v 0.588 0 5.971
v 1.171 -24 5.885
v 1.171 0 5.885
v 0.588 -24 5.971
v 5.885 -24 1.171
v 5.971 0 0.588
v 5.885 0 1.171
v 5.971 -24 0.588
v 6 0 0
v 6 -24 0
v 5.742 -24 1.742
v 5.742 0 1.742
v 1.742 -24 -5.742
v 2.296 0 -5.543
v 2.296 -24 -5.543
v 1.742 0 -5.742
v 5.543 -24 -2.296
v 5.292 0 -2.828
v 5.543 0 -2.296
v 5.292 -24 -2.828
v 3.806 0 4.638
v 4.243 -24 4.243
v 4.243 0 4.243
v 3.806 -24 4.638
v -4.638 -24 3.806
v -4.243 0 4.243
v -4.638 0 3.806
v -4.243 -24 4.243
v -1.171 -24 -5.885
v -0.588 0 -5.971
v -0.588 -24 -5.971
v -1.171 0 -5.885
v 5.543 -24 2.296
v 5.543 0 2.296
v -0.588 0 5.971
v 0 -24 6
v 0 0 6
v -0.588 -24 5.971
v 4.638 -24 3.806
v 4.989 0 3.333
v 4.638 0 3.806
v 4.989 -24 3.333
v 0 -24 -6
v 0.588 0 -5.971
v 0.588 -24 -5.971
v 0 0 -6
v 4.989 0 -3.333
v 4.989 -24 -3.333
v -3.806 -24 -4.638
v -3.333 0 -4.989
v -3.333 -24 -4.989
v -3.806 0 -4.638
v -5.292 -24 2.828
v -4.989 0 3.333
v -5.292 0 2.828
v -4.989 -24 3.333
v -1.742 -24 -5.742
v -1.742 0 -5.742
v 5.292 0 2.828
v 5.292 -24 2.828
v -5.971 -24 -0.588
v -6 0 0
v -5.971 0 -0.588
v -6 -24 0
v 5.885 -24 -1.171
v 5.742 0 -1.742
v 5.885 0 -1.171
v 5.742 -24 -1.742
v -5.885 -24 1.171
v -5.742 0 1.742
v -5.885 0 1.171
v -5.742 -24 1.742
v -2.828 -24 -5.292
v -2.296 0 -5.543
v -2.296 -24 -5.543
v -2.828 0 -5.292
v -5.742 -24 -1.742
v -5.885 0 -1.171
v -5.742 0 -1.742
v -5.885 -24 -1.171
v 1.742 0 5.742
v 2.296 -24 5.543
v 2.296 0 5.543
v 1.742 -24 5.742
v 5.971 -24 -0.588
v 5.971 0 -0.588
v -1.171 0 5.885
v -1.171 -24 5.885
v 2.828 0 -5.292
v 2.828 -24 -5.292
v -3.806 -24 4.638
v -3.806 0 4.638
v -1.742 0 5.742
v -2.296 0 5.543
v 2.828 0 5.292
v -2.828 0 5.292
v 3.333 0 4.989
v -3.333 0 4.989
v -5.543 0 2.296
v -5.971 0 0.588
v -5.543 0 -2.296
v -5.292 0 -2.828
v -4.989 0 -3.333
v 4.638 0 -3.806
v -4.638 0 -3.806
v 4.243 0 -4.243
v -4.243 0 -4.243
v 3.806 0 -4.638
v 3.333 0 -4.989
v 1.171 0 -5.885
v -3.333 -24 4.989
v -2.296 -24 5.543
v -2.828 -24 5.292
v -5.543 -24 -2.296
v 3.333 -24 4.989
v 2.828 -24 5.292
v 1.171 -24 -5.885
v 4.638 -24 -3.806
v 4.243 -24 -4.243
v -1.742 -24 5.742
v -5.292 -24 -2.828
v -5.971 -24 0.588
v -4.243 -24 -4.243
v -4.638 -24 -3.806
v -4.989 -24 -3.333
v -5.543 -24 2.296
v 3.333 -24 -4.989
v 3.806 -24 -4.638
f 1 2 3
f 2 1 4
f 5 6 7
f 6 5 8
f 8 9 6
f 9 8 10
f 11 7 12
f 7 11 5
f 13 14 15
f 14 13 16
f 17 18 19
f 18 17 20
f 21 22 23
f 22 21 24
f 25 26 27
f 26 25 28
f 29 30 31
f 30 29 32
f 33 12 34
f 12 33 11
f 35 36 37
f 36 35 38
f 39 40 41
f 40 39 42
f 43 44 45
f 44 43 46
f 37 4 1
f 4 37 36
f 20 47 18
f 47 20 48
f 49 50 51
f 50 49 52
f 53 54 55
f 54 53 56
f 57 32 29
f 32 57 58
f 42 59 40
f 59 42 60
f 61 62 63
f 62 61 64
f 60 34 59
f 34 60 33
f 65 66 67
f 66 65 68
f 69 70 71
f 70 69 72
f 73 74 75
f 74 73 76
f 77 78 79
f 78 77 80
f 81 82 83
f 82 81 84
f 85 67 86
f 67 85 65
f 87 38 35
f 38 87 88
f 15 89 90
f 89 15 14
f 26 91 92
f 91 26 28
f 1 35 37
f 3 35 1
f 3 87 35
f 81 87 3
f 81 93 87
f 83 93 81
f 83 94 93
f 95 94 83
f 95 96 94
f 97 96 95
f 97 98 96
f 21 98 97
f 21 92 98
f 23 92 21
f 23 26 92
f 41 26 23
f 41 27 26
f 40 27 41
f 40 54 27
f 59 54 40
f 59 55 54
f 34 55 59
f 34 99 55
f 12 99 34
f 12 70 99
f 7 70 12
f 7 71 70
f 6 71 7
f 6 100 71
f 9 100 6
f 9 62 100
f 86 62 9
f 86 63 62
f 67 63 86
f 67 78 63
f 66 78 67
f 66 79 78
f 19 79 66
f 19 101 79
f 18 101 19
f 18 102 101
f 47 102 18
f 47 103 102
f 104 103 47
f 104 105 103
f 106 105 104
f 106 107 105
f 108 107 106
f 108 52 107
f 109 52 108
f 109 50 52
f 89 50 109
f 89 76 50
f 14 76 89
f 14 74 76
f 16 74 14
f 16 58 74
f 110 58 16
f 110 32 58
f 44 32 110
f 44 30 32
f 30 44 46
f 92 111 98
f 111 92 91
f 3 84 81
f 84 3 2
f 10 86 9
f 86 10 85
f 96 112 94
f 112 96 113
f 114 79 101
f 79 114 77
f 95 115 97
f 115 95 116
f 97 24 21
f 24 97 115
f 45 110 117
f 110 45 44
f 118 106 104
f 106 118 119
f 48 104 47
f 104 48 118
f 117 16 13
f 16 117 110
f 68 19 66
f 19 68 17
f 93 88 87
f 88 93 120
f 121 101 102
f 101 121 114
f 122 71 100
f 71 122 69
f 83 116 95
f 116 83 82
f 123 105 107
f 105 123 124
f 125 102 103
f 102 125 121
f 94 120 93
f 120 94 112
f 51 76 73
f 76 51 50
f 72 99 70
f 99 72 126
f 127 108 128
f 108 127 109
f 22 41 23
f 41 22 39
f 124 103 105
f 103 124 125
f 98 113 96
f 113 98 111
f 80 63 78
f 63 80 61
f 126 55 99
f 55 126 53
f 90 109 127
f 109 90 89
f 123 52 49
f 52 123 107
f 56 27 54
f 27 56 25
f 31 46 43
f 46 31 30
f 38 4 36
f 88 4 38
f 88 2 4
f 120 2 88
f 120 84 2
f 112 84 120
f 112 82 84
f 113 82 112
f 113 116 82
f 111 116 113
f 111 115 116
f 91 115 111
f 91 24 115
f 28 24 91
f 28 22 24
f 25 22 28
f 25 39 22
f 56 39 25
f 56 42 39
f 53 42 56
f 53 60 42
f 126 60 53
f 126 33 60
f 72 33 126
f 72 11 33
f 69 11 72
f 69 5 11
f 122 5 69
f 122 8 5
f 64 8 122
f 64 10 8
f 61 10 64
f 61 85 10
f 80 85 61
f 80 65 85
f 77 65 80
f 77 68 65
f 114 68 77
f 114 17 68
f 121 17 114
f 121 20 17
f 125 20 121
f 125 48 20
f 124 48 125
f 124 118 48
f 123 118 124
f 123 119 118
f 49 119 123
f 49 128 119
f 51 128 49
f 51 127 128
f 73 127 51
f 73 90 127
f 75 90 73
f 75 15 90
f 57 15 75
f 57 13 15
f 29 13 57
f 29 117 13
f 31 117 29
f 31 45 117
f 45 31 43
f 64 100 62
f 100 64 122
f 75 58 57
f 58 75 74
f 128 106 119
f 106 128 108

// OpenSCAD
rotate([90, 0, 0]) {
    union() {
        cylinder(h=24, r1=6, r2=6, $fn=64);
        translate([0, 0, 4]) {
            cylinder(h=4, r1=5, r2=5, $fn=64);
        }
        translate([0, 0, 8]) {
            cylinder(h=4, r1=6, r2=6, $fn=64);
        }
        translate([0, 0, 12]) {
            cylinder(h=4, r1=5, r2=5, $fn=64);
        }
        translate([0, 0, 16]) {
            cylinder(h=4, r1=6, r2=6, $fn=64);
        }
        translate([0, 0, 20]) {
            cylinder(h=4, r1=5, r2=5, $fn=64);
        }
    }
}
